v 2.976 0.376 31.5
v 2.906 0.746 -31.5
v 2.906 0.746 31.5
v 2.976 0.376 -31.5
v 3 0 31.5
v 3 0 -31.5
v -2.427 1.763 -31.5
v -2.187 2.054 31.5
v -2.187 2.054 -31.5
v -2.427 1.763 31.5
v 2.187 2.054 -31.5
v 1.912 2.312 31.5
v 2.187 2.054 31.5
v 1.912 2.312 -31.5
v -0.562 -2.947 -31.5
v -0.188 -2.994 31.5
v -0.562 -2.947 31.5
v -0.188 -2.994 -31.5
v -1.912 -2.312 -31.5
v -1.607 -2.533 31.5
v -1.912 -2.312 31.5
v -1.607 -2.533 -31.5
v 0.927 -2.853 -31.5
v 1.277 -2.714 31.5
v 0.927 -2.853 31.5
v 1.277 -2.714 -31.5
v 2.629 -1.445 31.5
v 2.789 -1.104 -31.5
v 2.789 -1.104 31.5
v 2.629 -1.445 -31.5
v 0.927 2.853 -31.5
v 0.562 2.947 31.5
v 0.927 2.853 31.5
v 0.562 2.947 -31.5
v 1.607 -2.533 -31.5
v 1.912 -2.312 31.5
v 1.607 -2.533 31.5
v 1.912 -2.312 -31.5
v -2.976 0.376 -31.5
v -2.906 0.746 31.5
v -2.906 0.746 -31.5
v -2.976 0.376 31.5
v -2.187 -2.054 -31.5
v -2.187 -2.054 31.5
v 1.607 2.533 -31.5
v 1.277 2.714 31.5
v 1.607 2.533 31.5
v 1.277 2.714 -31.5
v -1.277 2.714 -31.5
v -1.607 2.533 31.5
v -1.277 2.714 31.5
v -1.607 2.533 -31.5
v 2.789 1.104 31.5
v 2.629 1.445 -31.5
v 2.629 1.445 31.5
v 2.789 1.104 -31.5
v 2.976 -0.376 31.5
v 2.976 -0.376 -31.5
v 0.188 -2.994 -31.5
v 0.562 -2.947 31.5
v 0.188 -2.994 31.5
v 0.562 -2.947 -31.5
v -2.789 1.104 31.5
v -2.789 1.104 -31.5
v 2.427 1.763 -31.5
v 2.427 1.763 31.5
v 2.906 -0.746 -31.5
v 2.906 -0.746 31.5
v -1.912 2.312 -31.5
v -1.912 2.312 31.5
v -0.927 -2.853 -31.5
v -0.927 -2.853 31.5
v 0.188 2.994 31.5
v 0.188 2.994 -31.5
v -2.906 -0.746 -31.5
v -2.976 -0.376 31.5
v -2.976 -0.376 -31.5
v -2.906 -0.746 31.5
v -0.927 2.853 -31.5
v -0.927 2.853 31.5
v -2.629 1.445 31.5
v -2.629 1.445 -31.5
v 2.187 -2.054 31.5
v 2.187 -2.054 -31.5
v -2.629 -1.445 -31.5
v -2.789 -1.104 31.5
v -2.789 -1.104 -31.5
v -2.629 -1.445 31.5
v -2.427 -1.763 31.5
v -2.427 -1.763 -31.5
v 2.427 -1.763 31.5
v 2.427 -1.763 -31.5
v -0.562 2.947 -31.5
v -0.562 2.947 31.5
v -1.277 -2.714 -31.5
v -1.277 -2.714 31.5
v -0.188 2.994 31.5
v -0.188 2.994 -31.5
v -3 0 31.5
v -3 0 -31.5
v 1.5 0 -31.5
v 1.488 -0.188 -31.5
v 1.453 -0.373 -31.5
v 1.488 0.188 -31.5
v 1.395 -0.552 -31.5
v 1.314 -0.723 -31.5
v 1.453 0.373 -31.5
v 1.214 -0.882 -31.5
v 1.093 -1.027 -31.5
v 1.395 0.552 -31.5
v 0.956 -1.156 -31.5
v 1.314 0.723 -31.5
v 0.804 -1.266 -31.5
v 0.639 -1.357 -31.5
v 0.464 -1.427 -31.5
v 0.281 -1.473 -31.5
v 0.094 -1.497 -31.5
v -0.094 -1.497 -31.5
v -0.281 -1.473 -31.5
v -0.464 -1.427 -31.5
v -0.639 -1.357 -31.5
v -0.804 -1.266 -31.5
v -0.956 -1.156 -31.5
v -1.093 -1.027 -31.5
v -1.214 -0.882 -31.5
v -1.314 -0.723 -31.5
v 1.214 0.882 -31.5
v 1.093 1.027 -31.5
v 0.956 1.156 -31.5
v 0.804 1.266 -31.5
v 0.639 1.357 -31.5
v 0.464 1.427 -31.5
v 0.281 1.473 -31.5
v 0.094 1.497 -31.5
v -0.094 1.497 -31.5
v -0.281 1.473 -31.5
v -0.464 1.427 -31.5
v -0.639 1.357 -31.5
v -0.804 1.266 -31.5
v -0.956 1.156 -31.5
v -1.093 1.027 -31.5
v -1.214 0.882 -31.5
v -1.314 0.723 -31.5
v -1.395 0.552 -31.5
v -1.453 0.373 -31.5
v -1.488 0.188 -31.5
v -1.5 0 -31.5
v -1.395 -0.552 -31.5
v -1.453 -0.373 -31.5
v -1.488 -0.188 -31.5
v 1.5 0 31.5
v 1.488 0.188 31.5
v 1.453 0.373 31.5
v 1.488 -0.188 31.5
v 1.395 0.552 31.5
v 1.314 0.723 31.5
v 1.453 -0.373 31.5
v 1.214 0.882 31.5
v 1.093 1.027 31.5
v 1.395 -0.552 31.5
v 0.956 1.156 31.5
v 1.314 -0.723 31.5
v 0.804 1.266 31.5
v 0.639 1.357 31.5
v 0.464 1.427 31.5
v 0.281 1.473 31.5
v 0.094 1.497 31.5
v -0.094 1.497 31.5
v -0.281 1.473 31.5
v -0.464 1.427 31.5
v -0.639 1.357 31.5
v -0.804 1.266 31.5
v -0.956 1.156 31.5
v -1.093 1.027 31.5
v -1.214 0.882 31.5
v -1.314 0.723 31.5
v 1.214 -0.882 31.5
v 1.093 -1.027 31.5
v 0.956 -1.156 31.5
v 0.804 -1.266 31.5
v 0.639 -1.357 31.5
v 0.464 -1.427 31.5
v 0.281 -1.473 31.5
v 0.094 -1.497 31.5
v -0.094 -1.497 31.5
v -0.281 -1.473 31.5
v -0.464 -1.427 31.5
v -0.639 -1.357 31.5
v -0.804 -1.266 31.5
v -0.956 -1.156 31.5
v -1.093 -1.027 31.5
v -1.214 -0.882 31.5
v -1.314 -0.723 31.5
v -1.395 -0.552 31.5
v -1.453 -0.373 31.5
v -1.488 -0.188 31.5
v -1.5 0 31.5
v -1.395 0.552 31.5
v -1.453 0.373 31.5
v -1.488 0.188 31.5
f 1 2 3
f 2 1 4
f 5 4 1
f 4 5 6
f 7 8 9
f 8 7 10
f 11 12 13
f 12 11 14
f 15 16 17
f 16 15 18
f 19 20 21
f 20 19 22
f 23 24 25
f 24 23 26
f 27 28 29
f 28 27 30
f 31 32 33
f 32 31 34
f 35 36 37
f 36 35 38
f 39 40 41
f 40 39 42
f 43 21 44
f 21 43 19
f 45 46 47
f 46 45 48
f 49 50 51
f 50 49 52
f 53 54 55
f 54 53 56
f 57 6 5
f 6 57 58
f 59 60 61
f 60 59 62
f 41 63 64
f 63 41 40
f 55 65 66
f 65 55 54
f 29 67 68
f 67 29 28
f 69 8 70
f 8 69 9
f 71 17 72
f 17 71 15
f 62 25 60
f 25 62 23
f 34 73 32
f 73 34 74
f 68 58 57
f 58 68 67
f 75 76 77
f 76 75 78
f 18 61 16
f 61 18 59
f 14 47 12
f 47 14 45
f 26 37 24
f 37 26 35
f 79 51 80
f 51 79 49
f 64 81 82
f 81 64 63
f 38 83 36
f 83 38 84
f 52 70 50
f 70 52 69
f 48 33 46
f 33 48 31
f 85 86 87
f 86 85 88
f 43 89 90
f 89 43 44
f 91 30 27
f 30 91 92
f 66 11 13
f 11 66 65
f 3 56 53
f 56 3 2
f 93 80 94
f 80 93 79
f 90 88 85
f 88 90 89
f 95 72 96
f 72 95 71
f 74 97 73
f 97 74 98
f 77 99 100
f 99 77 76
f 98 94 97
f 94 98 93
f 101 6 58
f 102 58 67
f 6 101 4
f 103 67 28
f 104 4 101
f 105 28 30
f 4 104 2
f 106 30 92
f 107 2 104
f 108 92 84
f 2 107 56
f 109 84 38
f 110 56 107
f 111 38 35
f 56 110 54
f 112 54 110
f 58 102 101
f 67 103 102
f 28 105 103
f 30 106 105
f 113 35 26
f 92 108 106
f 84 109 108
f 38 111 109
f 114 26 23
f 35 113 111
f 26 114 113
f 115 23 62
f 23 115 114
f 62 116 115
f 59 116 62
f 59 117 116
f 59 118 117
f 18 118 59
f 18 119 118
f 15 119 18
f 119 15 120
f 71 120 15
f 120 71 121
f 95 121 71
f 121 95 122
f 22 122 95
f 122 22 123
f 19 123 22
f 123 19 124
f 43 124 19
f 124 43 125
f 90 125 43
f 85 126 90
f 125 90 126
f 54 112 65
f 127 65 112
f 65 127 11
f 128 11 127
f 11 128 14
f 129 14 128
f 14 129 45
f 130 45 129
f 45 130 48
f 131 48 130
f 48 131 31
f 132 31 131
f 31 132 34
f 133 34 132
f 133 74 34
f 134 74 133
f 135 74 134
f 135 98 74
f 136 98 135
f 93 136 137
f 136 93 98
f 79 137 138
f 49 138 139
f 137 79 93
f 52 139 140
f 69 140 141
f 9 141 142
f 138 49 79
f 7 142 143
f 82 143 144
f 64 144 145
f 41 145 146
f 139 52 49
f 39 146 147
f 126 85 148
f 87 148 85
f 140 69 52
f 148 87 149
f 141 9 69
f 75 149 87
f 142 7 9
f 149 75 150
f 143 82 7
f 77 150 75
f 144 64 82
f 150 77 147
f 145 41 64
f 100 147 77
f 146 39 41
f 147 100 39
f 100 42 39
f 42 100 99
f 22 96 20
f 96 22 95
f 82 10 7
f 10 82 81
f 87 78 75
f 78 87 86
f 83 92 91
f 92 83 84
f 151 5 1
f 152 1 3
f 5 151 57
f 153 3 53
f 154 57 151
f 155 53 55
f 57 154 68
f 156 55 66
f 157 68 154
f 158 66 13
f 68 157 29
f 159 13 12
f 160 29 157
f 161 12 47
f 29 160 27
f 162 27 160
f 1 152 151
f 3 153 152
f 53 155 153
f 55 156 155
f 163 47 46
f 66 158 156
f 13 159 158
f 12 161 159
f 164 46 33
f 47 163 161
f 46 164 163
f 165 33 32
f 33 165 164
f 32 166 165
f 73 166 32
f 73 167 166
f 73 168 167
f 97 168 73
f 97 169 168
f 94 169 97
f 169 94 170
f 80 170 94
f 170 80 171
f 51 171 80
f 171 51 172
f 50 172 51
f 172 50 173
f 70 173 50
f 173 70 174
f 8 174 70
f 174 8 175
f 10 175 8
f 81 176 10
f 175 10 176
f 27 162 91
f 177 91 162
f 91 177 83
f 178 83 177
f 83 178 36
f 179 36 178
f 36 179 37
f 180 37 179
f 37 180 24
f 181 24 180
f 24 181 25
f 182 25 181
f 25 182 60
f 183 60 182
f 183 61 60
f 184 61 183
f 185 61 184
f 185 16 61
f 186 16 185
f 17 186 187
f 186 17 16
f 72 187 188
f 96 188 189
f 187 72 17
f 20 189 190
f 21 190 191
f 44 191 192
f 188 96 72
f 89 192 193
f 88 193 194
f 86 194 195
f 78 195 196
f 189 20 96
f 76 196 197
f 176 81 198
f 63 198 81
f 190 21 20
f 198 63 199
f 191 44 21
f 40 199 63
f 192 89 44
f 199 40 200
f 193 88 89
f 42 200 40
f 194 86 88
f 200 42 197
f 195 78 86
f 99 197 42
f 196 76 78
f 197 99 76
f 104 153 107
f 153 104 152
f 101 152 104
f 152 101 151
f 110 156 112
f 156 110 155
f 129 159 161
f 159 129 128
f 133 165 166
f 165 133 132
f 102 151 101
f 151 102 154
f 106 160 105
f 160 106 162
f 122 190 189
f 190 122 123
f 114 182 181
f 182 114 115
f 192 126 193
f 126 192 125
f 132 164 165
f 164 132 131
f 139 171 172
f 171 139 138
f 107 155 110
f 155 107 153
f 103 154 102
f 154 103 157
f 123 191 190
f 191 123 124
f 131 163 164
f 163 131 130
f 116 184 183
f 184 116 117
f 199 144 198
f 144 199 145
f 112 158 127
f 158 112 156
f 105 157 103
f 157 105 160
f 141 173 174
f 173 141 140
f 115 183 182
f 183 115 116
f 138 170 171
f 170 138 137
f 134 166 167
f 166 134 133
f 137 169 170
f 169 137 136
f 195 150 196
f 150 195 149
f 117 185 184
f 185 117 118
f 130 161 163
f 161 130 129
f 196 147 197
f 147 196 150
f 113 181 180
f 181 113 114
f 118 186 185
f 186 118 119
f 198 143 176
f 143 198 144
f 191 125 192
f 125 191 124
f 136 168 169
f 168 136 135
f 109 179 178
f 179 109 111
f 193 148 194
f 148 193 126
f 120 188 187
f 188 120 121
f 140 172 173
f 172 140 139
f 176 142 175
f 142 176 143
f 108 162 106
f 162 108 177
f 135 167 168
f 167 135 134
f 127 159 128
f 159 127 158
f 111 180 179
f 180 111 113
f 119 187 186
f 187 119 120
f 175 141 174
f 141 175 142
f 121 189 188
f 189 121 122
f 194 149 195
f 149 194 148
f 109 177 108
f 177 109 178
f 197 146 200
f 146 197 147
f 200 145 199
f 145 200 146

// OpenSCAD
$fn = 50;


difference() {
	union() {
		translate(v = [0, 0, -31.5000000000]) {
			cylinder(h = 63, r = 3.0000000000);
		}
	}
	union() {
		translate(v = [0, 0, -100.0000000000]) {
			cylinder(h = 200, r = 1.5000000000);
		}
	}
}
